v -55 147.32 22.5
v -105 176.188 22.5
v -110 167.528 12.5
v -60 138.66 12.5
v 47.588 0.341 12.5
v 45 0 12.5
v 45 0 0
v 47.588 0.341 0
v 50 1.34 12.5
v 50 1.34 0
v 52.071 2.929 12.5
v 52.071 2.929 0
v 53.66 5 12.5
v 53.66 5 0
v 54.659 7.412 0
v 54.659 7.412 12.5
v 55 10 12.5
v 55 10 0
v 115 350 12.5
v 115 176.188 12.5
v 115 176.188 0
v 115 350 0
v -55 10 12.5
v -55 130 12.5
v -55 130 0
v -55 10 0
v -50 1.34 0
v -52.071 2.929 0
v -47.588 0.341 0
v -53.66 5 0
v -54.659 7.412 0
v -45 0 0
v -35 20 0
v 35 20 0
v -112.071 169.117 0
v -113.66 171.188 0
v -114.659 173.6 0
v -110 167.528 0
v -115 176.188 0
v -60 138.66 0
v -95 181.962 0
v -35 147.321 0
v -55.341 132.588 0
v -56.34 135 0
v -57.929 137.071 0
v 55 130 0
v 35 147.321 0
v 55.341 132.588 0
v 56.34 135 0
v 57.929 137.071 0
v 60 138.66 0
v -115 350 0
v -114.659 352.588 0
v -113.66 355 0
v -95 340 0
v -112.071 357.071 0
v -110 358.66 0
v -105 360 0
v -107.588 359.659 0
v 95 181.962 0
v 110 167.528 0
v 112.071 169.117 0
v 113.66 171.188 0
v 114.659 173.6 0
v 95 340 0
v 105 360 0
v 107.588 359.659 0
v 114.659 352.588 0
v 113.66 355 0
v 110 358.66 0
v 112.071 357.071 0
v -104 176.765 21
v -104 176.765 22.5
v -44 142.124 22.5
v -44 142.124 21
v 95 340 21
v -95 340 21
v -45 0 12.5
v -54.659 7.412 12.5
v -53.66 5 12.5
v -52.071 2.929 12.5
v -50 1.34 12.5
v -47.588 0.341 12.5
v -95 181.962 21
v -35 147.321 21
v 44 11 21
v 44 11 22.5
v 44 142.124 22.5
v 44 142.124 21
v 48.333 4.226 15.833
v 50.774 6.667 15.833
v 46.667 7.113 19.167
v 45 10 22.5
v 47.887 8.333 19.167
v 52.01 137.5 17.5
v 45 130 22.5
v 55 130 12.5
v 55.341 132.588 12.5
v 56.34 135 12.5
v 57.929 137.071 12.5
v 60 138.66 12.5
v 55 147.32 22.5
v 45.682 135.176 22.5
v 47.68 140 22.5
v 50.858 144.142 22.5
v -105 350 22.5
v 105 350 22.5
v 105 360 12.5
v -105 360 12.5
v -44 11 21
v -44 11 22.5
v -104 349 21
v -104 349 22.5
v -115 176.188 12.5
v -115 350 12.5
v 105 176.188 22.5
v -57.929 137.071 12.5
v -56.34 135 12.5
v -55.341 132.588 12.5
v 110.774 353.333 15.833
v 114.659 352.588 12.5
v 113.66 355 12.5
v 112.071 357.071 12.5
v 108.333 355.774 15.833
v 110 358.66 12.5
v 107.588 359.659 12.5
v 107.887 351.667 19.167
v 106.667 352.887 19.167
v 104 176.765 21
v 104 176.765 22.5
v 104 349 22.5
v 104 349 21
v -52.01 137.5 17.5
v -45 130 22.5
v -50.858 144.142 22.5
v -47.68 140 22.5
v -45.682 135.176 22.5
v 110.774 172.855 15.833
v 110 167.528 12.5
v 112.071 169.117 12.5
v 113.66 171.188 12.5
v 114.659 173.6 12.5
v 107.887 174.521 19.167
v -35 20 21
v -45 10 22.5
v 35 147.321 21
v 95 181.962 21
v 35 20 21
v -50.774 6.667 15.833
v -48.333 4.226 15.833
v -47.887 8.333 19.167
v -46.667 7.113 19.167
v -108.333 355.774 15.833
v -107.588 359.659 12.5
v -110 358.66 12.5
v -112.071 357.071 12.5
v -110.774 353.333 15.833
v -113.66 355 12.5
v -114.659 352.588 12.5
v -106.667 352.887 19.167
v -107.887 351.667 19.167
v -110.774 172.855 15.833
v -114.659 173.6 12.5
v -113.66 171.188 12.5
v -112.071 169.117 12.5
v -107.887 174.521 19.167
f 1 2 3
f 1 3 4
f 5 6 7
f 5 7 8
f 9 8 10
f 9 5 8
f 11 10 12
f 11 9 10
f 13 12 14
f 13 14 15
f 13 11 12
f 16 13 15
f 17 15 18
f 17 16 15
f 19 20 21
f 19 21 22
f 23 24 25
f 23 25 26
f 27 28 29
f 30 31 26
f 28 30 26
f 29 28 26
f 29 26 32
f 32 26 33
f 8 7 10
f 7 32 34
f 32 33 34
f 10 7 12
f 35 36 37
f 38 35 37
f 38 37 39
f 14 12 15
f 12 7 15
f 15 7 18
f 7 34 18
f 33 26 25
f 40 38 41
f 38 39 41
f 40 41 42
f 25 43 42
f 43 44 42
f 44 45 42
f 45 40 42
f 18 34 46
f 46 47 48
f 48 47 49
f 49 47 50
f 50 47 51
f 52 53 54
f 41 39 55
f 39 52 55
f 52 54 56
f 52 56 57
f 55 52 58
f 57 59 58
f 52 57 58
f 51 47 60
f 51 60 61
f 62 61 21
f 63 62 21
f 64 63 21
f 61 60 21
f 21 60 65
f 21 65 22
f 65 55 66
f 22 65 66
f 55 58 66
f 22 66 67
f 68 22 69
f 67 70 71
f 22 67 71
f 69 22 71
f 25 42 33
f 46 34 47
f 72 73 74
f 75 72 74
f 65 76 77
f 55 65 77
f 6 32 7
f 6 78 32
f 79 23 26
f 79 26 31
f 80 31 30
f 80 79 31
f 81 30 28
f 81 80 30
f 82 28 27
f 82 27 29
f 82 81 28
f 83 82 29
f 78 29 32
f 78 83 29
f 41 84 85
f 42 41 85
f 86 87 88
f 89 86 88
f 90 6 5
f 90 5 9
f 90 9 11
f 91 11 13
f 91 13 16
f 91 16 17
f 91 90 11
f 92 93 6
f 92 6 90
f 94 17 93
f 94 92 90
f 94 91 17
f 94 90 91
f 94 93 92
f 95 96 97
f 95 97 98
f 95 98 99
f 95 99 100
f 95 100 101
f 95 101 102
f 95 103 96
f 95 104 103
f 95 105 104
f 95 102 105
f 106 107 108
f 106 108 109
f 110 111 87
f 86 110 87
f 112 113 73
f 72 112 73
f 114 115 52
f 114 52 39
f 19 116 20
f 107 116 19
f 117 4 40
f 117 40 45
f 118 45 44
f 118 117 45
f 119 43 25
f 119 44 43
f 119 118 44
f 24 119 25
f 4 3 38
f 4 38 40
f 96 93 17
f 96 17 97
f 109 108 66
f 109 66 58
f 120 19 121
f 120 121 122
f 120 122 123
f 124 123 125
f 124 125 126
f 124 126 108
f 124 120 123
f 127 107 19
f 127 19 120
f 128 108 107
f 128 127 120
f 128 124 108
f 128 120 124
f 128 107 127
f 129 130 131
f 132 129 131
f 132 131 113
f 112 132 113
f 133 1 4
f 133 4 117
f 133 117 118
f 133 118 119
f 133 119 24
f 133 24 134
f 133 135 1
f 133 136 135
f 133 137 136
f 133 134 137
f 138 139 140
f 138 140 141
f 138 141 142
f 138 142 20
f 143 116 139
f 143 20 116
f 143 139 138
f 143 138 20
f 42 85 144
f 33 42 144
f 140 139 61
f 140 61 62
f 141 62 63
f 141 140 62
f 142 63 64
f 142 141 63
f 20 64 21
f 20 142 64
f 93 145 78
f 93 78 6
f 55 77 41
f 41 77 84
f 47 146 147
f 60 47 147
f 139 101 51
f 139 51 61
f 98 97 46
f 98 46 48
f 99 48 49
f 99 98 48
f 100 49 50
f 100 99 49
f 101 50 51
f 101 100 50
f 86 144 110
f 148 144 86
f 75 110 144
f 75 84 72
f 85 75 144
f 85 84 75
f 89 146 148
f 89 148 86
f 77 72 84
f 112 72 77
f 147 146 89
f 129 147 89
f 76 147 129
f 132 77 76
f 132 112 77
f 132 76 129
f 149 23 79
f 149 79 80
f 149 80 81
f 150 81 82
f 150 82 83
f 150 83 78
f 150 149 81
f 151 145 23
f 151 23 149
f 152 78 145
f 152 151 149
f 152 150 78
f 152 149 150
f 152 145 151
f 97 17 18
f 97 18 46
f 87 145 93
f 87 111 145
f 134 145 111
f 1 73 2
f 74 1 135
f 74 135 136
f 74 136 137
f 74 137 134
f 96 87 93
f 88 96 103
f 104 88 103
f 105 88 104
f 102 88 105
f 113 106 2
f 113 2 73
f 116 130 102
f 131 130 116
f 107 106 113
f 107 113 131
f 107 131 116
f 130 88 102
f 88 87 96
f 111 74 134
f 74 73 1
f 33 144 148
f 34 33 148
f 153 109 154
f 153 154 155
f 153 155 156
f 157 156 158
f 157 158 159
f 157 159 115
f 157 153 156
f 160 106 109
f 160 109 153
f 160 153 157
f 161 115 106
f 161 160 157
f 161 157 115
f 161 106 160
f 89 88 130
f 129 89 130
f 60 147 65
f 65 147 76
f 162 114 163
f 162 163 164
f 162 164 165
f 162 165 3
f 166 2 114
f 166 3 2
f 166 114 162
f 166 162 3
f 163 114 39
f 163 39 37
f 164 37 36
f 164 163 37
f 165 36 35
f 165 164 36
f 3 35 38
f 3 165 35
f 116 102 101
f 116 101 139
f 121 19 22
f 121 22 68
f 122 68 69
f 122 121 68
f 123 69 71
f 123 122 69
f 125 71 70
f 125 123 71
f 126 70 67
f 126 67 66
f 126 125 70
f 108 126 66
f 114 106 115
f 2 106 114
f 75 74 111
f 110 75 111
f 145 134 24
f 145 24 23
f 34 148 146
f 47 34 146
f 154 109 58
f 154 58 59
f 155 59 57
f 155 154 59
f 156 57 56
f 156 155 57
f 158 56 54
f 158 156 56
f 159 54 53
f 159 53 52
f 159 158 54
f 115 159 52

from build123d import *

# Parameters (mm, degrees)
RESSALTO_EXTRUS_O1_DEPTH = 22.5
CHANFRO1_SIZE            = 10
CORTE_EXTRUS_O1_REACH    = 380.591
ESBO_O3_W                = 1139.230904301
ESBO_O3_H                = 709.798033895
CORTE_EXTRUS_O5_DEPTH    = 1.5


with BuildPart() as part:
    # Esboço1 → Ressalto-extrusão1 (new, symmetric)
    with BuildSketch(Plane.XY):
        with BuildLine():
            Line((-45, 0), (45, 0))
            ThreePointArc((45, 0), (52.071067812, 2.928932188), (55, 10))
            Line((55, 10), (55, 130))
            ThreePointArc((55, 130), (56.339745962, 135), (60, 138.660254038))
            Line((60, 138.660254038), (110, 167.527767497))
            ThreePointArc((110, 167.527767497), (113.660254038, 171.188021535), (115, 176.188021535))
            Line((115, 176.188021535), (115, 350))
            ThreePointArc((115, 350), (112.071067812, 357.071067812), (105, 360))
            Line((105, 360), (-105, 360))
            ThreePointArc((-105, 360), (-112.071067812, 357.071067812), (-115, 350))
            Line((-115, 350), (-115, 176.188021535))
            ThreePointArc((-115, 176.188021535), (-113.660254038, 171.188021535), (-110, 167.527767497))
            Line((-110, 167.527767497), (-60, 138.660254038))
            ThreePointArc((-60, 138.660254038), (-56.339745962, 135), (-55, 130))
            Line((-55, 130), (-55, 10))
            ThreePointArc((-55, 10), (-52.071067812, 2.928932188), (-45, 0))
        make_face()
        Polygon((-35, 20), (35, 20), (35, 147.320508076), (95, 181.961524227), (95, 340), (-95, 340), (-95, 181.961524227), (-35, 147.320508076), align=None, mode=Mode.SUBTRACT)
    extrude(amount=RESSALTO_EXTRUS_O1_DEPTH, both=True)

    # Chanfro1
    chanfro1_edges = [part.edges().sort_by_distance(p)[0] for p in [
        (113.660254038, 171.188021535, 22.5),
        (115, 263.094010768, 22.5),
        (115, 263.094010768, -22.5),
        (113.660254038, 171.188021535, -22.5),
        (85, 153.094010768, -22.5),
        (56.339745962, 135, -22.5),
        (55, 70, -22.5),
        (52.071067812, 2.928932188, -22.5),
        (0, 0, -22.5),
        (-52.071067812, 2.928932188, -22.5),
        (-55, 70, -22.5),
        (-56.339745962, 135, -22.5),
        (-85, 153.094010768, -22.5),
        (-113.660254038, 171.188021535, -22.5),
        (-115, 263.094010768, -22.5),
        (-112.071067812, 357.071067812, -22.5),
        (0, 360, -22.5),
        (112.071067812, 357.071067812, -22.5),
        (112.071067812, 357.071067812, 22.5),
        (0, 360, 22.5),
        (-112.071067812, 357.071067812, 22.5),
        (-115, 263.094010768, 22.5),
        (-113.660254038, 171.188021535, 22.5),
        (-85, 153.094010768, 22.5),
        (-56.339745962, 135, 22.5),
        (-55, 70, 22.5),
        (-52.071067812, 2.928932188, 22.5),
        (0, 0, 22.5),
        (52.071067812, 2.928932188, 22.5),
        (55, 70, 22.5),
        (56.339745962, 135, 22.5),
        (85, 153.094010768, 22.5),
    ]]
    chamfer(chanfro1_edges, length=CHANFRO1_SIZE - 0.0001)  # a hair under: the kernel refuses the full size

    # Esboço3 → Corte-extrusão1 (cut, up to next)
    with BuildSketch(Plane.XY, mode=Mode.PRIVATE) as corte_extrus_o1_sk1:
        with Locations((-153.157436203, 152.53565808)):
            Rectangle(ESBO_O3_W, ESBO_O3_H)
    corte_extrus_o1_tool1 = extrude(corte_extrus_o1_sk1.sketch, amount=-CORTE_EXTRUS_O1_REACH, mode=Mode.PRIVATE) & part.part
    add(corte_extrus_o1_tool1.solids().sort_by_distance((-153.157436, 152.535658, 0))[0], mode=Mode.SUBTRACT)

    # Esboço4 → Corte-extrusão5 (cut)
    with BuildSketch(Plane.XY.offset(22.5)):
        Polygon((104, 349), (-104, 349), (-104, 176.765371804), (-44, 142.124355653), (-44, 11), (44, 11), (44, 142.124355653), (104, 176.765371804), align=None)
        Polygon((-95, 340), (-95, 181.961524227), (-35, 147.320508076), (-35, 20), (0, 20), (35, 20), (35, 147.320508076), (95, 181.961524227), (95, 340), align=None, mode=Mode.SUBTRACT)
    extrude(amount=-CORTE_EXTRUS_O5_DEPTH, mode=Mode.SUBTRACT)


solid = part.part
